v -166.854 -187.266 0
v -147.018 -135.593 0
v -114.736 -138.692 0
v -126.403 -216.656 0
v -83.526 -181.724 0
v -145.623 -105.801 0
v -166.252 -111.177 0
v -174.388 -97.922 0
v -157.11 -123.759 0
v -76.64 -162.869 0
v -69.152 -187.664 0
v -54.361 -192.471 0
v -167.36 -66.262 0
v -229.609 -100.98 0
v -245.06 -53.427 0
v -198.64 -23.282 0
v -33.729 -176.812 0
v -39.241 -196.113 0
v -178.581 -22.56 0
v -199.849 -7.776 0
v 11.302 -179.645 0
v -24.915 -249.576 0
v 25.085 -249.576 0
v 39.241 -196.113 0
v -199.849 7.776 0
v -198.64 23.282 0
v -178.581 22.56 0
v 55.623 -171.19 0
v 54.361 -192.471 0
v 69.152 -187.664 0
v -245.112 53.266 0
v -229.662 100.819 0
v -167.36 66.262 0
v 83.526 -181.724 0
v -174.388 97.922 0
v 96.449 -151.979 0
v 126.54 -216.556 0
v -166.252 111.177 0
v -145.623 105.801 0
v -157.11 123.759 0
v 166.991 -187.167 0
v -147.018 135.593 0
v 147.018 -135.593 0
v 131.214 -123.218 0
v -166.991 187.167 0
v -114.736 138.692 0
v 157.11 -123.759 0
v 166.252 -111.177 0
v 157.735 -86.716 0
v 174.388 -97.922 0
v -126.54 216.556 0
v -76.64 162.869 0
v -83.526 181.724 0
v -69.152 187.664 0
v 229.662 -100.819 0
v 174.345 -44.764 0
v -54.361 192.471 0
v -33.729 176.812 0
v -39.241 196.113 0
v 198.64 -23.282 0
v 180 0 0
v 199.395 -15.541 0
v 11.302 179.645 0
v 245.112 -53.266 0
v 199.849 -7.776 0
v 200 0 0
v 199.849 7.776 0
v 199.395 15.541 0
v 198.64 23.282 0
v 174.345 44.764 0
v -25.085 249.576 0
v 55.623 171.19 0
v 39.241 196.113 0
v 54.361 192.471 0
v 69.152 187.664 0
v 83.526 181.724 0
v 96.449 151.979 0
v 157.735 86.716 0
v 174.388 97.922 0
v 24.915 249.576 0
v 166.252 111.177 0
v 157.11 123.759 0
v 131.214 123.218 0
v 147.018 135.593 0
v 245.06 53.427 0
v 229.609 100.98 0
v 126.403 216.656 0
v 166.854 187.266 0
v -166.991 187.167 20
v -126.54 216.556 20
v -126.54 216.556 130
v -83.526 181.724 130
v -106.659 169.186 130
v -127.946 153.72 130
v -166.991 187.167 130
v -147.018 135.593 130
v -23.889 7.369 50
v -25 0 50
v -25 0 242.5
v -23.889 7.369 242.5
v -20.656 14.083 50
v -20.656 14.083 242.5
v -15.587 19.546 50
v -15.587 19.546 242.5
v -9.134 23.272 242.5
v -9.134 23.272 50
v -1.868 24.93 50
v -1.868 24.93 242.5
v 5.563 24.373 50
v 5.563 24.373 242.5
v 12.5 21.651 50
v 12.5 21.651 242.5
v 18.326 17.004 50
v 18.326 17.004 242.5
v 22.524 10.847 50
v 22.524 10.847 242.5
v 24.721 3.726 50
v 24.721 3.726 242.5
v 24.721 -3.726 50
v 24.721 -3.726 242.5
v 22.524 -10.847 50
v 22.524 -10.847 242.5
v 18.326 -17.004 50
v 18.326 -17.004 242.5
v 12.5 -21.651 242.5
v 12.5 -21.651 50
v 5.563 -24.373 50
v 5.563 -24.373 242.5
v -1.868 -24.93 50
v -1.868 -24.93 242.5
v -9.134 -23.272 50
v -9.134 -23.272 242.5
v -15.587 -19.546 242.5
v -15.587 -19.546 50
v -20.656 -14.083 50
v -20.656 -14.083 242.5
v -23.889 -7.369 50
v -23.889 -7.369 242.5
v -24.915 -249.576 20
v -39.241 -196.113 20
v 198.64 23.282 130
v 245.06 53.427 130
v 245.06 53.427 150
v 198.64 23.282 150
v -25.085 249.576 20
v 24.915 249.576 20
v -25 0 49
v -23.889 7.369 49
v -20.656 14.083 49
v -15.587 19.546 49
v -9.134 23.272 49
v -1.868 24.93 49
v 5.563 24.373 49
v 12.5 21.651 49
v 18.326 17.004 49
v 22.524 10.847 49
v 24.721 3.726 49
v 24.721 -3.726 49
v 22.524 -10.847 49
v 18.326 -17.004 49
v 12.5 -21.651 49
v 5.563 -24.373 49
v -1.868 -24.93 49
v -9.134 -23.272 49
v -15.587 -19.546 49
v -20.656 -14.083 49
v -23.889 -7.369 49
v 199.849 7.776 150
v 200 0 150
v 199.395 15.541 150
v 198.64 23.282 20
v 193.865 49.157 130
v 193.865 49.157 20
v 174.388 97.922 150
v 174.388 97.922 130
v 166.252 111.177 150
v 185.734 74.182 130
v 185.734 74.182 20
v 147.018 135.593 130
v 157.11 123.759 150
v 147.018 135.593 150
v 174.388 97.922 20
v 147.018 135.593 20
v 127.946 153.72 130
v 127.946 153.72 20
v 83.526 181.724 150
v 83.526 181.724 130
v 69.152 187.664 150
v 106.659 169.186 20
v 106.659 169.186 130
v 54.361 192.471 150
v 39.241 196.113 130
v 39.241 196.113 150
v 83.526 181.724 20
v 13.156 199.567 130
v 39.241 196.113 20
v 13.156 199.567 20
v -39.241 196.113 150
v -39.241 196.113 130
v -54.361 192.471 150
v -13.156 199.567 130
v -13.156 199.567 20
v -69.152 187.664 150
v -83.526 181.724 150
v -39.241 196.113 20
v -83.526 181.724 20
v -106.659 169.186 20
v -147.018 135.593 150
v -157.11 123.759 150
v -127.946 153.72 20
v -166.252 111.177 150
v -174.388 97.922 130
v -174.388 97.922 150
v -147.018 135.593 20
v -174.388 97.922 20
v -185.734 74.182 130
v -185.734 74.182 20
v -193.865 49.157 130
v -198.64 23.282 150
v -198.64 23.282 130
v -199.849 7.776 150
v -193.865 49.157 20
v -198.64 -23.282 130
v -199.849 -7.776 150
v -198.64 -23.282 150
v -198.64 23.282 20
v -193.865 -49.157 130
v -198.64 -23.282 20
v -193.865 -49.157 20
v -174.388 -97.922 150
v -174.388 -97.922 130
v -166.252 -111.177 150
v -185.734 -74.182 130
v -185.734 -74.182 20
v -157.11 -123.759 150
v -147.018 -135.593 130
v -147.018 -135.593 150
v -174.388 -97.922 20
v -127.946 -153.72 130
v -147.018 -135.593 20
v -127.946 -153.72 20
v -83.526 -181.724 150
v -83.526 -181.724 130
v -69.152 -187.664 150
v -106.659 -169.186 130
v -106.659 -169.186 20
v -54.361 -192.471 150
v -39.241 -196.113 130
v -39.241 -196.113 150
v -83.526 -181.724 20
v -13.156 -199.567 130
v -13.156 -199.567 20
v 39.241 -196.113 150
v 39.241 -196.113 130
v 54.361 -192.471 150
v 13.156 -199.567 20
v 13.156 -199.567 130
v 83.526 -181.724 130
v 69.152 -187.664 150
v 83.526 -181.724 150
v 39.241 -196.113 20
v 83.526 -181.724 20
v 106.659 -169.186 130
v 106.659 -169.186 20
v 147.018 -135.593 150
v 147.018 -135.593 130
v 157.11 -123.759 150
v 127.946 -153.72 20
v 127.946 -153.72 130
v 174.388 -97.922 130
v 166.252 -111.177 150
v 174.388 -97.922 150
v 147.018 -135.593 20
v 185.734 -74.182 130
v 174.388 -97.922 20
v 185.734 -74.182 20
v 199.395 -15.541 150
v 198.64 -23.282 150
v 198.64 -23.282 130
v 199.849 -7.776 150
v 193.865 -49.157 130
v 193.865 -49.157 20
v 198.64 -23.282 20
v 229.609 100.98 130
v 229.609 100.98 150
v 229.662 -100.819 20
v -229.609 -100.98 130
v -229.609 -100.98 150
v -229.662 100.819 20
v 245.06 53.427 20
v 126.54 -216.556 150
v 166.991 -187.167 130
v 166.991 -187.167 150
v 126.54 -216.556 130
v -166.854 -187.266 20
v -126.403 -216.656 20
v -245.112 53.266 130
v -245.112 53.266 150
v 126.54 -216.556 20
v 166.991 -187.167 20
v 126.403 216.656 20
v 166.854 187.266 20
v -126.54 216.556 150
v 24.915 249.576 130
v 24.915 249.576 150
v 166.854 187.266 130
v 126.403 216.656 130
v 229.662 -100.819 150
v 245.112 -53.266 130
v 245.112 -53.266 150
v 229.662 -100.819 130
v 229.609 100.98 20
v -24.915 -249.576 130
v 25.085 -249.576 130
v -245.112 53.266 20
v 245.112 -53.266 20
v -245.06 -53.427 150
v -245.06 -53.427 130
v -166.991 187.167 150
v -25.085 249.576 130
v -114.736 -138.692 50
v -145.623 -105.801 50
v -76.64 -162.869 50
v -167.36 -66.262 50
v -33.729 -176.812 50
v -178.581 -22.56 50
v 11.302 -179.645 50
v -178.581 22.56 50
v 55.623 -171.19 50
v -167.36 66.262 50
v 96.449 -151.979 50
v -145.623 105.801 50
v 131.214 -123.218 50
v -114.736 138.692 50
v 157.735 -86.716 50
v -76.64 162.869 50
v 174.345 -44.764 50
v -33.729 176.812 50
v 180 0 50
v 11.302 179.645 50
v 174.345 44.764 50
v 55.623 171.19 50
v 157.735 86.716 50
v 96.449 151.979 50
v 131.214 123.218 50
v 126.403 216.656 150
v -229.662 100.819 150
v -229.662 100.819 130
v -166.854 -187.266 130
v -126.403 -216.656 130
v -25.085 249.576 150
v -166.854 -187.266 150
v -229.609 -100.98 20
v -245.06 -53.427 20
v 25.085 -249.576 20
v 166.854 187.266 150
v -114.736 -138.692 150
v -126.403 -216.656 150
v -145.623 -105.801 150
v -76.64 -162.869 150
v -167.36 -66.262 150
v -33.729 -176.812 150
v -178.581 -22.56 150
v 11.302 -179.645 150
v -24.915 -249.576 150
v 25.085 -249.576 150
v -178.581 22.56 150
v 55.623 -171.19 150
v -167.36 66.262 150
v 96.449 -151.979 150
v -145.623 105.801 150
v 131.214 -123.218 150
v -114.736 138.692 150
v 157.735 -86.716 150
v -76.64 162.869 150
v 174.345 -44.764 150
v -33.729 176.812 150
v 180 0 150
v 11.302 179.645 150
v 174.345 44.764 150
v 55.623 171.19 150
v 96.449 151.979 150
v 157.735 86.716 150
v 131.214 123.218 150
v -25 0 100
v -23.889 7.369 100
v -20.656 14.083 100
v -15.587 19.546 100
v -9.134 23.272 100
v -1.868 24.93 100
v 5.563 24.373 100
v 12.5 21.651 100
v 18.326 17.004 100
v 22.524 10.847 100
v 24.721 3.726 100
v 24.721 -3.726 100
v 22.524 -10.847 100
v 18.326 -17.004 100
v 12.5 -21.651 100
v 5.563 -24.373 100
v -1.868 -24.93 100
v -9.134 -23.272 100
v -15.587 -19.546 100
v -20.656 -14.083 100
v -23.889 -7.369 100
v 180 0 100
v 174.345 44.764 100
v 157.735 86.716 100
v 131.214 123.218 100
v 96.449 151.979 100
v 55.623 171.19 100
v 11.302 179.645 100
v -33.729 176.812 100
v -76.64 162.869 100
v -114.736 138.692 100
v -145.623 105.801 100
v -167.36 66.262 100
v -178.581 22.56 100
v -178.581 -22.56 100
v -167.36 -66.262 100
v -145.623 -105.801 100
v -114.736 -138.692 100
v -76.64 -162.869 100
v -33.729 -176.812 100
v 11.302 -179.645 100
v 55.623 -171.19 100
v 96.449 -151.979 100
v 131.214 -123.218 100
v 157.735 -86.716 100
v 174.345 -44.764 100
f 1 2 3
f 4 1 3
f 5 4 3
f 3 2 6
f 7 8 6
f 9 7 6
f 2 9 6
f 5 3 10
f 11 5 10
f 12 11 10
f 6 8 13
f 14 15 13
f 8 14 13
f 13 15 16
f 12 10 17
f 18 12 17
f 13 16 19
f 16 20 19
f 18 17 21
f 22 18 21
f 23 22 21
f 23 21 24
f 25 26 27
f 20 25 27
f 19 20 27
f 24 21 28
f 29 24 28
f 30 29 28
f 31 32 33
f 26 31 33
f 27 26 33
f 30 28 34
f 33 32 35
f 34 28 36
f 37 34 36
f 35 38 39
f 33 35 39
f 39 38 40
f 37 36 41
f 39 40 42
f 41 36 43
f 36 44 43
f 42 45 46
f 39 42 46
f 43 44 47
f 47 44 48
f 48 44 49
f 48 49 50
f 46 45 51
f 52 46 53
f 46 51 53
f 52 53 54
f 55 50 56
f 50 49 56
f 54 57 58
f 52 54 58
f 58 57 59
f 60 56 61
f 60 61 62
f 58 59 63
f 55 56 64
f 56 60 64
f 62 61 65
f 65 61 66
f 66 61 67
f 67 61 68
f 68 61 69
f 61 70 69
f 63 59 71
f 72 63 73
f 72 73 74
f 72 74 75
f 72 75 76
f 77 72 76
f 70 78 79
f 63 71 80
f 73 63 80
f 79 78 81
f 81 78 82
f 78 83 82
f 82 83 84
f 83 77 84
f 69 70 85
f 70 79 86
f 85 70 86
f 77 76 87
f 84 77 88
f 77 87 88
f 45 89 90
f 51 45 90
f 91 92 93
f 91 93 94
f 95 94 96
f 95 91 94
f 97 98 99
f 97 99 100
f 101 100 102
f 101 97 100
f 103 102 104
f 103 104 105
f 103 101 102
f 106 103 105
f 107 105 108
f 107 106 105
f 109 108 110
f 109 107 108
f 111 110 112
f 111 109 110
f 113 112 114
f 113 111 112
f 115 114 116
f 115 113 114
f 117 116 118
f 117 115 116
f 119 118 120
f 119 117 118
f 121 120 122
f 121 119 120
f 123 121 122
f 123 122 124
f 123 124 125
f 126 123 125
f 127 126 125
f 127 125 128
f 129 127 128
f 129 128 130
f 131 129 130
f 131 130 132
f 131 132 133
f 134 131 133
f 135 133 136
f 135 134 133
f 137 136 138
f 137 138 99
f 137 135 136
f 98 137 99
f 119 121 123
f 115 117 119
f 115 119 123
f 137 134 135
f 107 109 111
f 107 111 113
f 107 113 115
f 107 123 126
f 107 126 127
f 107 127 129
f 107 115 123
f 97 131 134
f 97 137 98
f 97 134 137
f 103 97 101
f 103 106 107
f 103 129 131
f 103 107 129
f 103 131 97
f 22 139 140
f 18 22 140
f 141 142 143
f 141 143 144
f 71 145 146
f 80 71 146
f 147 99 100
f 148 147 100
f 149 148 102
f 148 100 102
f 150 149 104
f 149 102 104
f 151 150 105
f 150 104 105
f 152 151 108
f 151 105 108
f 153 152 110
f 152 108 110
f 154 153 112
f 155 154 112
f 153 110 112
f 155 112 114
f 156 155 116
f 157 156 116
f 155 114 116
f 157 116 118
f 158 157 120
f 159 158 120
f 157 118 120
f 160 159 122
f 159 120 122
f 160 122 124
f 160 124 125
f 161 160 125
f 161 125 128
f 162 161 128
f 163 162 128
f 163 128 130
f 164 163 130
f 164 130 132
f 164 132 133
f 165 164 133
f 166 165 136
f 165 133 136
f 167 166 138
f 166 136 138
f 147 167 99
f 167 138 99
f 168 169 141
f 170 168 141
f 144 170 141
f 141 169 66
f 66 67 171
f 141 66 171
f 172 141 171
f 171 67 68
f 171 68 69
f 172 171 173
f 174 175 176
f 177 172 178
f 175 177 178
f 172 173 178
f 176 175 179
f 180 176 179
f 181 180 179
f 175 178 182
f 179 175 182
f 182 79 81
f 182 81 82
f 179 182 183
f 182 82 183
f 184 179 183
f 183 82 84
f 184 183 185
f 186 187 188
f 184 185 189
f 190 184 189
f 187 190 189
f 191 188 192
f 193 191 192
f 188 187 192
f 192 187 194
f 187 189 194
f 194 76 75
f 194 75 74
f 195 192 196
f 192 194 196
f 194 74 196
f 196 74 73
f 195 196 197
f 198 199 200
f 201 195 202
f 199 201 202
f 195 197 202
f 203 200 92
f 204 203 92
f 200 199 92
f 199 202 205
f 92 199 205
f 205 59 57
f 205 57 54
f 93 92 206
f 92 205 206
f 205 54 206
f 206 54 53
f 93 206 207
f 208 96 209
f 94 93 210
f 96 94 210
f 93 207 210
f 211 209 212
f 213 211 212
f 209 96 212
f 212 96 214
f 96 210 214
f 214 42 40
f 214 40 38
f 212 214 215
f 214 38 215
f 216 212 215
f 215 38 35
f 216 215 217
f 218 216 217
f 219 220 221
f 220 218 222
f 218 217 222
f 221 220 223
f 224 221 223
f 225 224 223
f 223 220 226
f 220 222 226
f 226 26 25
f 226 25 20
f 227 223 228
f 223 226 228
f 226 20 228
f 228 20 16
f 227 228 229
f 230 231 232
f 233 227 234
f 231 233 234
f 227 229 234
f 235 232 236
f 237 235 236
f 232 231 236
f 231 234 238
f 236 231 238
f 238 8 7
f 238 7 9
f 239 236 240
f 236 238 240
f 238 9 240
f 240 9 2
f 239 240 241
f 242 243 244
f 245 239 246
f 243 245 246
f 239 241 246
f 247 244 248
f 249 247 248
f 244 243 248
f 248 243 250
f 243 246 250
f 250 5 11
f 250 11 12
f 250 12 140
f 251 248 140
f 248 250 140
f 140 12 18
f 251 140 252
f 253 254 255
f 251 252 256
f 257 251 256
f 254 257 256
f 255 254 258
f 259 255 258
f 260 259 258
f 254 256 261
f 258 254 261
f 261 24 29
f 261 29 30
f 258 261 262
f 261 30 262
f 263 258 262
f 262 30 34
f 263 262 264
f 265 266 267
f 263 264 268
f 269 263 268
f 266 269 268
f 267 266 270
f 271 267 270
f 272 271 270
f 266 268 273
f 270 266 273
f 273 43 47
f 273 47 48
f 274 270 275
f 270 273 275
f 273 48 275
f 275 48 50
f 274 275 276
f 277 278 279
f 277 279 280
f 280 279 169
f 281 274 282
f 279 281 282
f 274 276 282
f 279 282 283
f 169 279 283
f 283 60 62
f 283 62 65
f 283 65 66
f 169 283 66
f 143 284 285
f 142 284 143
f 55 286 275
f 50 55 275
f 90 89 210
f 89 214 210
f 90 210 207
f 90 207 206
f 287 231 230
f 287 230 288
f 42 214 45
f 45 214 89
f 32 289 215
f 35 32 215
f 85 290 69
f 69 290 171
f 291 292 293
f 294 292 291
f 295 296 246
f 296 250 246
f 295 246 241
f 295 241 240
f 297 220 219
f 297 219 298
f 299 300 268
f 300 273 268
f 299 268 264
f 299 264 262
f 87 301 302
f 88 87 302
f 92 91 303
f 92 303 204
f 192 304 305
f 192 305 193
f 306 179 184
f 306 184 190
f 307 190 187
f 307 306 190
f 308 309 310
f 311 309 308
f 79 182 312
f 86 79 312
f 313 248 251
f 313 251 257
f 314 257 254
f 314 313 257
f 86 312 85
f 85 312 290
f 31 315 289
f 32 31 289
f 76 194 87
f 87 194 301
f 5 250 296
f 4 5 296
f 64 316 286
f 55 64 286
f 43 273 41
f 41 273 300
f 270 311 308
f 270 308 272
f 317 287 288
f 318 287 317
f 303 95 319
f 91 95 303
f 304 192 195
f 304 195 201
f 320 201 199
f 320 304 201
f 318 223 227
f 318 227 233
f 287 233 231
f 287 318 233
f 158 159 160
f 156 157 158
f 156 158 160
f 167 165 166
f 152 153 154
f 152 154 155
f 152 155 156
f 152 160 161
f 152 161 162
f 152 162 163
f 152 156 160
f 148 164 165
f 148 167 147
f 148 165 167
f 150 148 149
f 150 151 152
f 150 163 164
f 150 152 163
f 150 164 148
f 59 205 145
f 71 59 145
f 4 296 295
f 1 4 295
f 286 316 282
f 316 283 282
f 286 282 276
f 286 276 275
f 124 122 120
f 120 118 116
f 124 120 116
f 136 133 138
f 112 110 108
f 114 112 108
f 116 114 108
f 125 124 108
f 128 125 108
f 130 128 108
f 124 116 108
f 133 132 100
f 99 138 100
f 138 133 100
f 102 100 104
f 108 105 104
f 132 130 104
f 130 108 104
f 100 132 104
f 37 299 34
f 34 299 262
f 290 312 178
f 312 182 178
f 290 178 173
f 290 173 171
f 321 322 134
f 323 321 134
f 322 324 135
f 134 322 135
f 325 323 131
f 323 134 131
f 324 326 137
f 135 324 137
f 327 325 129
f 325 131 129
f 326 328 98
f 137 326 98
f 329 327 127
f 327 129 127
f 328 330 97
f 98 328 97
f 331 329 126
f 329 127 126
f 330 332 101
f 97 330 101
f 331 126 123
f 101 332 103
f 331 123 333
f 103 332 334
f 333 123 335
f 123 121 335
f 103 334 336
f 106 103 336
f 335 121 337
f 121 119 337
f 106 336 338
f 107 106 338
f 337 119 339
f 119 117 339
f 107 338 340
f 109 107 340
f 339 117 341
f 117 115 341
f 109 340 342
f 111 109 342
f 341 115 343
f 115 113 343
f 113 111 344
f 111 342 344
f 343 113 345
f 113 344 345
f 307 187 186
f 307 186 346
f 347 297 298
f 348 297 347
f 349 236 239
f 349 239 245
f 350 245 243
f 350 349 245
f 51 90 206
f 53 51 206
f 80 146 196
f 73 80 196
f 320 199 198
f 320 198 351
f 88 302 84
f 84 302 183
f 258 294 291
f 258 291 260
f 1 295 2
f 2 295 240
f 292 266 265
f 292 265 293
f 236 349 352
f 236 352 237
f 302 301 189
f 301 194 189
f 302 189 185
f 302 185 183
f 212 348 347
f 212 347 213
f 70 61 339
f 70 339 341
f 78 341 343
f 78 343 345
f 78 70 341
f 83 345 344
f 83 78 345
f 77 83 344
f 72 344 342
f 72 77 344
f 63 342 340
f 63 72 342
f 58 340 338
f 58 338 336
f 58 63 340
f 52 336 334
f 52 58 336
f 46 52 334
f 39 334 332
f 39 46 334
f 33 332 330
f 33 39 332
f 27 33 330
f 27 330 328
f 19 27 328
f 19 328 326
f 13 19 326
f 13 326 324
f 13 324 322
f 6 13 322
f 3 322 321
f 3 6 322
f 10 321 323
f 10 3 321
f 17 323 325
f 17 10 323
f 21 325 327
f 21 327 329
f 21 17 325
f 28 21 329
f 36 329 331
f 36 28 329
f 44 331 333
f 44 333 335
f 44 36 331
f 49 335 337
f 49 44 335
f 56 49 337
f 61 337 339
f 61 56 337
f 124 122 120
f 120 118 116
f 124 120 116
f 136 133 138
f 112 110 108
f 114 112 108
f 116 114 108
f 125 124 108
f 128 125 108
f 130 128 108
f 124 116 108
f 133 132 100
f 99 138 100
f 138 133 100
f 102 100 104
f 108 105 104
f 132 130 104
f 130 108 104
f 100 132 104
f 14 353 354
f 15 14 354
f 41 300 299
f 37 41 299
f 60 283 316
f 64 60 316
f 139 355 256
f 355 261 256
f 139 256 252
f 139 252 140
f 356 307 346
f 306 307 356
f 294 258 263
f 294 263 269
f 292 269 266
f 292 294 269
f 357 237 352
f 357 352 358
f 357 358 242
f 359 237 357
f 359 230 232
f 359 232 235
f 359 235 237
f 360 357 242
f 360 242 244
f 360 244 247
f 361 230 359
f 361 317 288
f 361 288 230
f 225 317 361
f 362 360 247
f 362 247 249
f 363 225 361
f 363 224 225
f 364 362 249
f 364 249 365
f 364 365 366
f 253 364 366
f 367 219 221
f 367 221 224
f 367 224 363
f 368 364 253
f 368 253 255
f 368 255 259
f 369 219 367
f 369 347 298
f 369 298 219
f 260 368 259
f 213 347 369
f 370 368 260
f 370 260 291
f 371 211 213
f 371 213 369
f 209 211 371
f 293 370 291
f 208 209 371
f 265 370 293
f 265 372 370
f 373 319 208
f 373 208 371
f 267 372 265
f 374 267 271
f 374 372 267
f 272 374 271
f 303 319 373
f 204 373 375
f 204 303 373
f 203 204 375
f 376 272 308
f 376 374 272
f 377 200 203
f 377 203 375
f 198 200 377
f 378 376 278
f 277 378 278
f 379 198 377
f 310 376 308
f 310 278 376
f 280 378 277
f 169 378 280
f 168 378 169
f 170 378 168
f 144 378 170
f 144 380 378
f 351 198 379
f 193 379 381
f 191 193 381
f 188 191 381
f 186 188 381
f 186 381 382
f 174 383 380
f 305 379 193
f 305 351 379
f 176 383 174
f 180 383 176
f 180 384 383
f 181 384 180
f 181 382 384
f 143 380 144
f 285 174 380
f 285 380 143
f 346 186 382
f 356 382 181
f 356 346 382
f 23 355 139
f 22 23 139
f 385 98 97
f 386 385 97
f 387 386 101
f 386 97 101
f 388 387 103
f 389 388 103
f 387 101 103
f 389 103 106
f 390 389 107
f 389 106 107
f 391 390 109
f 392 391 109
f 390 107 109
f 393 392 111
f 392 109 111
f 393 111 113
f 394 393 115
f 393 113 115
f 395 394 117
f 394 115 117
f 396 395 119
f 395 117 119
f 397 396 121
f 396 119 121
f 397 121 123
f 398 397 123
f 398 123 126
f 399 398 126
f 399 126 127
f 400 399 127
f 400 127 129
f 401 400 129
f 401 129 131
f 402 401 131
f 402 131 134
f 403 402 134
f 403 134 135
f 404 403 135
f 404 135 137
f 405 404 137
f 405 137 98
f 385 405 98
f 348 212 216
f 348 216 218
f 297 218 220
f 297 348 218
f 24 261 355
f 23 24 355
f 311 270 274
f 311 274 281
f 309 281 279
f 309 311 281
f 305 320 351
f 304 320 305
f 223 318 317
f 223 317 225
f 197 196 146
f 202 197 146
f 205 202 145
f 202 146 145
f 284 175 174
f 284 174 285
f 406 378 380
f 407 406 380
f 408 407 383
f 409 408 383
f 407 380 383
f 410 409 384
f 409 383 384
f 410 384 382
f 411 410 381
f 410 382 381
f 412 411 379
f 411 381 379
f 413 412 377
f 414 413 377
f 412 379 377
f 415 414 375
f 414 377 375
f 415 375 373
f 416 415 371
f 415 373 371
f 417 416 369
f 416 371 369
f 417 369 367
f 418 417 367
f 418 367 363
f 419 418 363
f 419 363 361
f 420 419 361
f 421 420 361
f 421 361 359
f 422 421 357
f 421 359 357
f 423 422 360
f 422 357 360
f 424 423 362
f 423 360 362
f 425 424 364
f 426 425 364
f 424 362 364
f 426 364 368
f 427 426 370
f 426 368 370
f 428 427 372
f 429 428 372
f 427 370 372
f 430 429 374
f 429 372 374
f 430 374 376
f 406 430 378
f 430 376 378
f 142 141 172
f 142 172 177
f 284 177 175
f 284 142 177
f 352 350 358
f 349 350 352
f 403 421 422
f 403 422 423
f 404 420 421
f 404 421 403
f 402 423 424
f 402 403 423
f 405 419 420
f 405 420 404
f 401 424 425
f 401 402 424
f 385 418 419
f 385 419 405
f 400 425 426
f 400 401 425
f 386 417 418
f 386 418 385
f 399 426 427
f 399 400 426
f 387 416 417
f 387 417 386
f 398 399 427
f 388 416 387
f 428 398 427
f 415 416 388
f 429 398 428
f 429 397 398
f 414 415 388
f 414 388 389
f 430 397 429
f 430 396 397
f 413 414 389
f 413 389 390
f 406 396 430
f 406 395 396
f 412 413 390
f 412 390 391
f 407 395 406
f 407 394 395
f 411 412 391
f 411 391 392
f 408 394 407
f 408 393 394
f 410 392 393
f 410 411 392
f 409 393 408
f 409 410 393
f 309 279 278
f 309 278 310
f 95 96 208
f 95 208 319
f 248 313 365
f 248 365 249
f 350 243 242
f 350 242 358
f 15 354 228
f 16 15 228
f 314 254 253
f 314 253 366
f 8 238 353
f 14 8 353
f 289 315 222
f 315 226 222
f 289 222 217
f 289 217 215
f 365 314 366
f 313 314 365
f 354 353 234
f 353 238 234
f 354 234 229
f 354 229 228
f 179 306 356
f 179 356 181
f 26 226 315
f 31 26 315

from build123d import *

# Parameters (mm, degrees)
SKETCH2_R                = 200
BOSS_EXTRUDE1_DEPTH      = 150
BOSS_EXTRUDE2_START      = -20
BOSS_EXTRUDE2_DEPTH      = 20
CIRPATTERN1_COUNT        = 10
MIRROR1_START            = -20
MIRROR1_COPY_1_DEPTH     = 20
MIRROR1_COPY_2_DEPTH     = 20
MIRROR1_COPY_3_DEPTH     = 20
MIRROR1_COPY_4_DEPTH     = 20
MIRROR1_COPY_5_DEPTH     = 20
MIRROR1_COPY_6_DEPTH     = 20
MIRROR1_COPY_7_DEPTH     = 20
MIRROR1_COPY_8_DEPTH     = 20
MIRROR1_COPY_9_DEPTH     = 20
MIRROR1_COPY_10_DEPTH    = 20
SKETCH4_R                = 25
CUT_EXTRUDE1_DEPTH       = 381.615674099
SKETCH6_R                = 180
CUT_EXTRUDE2_DEPTH       = 50
BOSS_EXTRUDE4_DEPTH      = 1
BOSS_EXTRUDE4_DEPTH_BACK = 192.5
SKETCH7_2_R              = 25
SKETCH7_R                = 25
BOSS_EXTRUDE3_DEPTH      = 192.5


with BuildPart() as part:
    # Sketch2 → Boss-Extrude1 (new body)
    with BuildSketch(Plane.XY):
        Circle(SKETCH2_R)
    extrude(amount=BOSS_EXTRUDE1_DEPTH)

    # Sketch3 → Boss-Extrude2 (add)
    with BuildSketch(Plane.XY.offset(150).offset(BOSS_EXTRUDE2_START)):
        with BuildLine():
            Line((-25.084847023, 249.575960236), (24.915152977, 249.575960236))
            Line((24.915152977, 249.575960236), (39.240601235, 196.112659496))
            ThreePointArc((39.240601235, 196.112659496), (0, 200), (-39.240601235, 196.112659496))
            Line((-39.240601235, 196.112659496), (-25.084847023, 249.575960236))
        make_face()
    boss_extrude2 = extrude(amount=BOSS_EXTRUDE2_DEPTH)

    # CirPattern1: Boss-Extrude2 ×10 about axis
    cirpattern1_axis = Axis((0, 0, 150), (0, 0, 1))
    for i in range(1, CIRPATTERN1_COUNT):
        add(boss_extrude2.rotate(cirpattern1_axis, i * 360 / CIRPATTERN1_COUNT))

    # Mirror1 copy 1 sketch → Mirror1 copy 1 (add)
    with BuildSketch(Plane(origin=(0, 0, 0), x_dir=(0.8090169943749475, 0.5877852522924731, 0), z_dir=(0, 0, -1)).offset(MIRROR1_START)):
        with BuildLine():
            Line((-25.084847023, -249.575960236), (24.915152977, -249.575960236))
            Line((24.915152977, -249.575960236), (39.240601235, -196.112659496))
            ThreePointArc((39.240601235, -196.112659496), (0, -200), (-39.240601235, -196.112659496))
            Line((-39.240601235, -196.112659496), (-25.084847023, -249.575960236))
        make_face()
    extrude(amount=MIRROR1_COPY_1_DEPTH)

    # Mirror1 copy 2 sketch → Mirror1 copy 2 (add)
    with BuildSketch(Plane(origin=(0, 0, 0), x_dir=(0.30901699437494745, 0.9510565162951535, 0), z_dir=(0, 0, -1)).offset(MIRROR1_START)):
        with BuildLine():
            Line((-25.084847023, -249.575960236), (24.915152977, -249.575960236))
            Line((24.915152977, -249.575960236), (39.240601235, -196.112659496))
            ThreePointArc((39.240601235, -196.112659496), (0, -200), (-39.240601235, -196.112659496))
            Line((-39.240601235, -196.112659496), (-25.084847023, -249.575960236))
        make_face()
    extrude(amount=MIRROR1_COPY_2_DEPTH)

    # Mirror1 copy 3 sketch → Mirror1 copy 3 (add)
    with BuildSketch(Plane(origin=(0, 0, 0), x_dir=(-0.30901699437494734, 0.9510565162951536, 0), z_dir=(0, 0, -1)).offset(MIRROR1_START)):
        with BuildLine():
            Line((-25.084847023, -249.575960236), (24.915152977, -249.575960236))
            Line((24.915152977, -249.575960236), (39.240601235, -196.112659496))
            ThreePointArc((39.240601235, -196.112659496), (0, -200), (-39.240601235, -196.112659496))
            Line((-39.240601235, -196.112659496), (-25.084847023, -249.575960236))
        make_face()
    extrude(amount=MIRROR1_COPY_3_DEPTH)

    # Mirror1 copy 4 sketch → Mirror1 copy 4 (add)
    with BuildSketch(Plane(origin=(0, 0, 0), x_dir=(-0.8090169943749473, 0.5877852522924732, 0), z_dir=(0, 0, -1)).offset(MIRROR1_START)):
        with BuildLine():
            Line((-25.084847023, -249.575960236), (24.915152977, -249.575960236))
            Line((24.915152977, -249.575960236), (39.240601235, -196.112659496))
            ThreePointArc((39.240601235, -196.112659496), (0, -200), (-39.240601235, -196.112659496))
            Line((-39.240601235, -196.112659496), (-25.084847023, -249.575960236))
        make_face()
    extrude(amount=MIRROR1_COPY_4_DEPTH)

    # Mirror1 copy 5 sketch → Mirror1 copy 5 (add)
    with BuildSketch(Plane(origin=(0, 0, 0), x_dir=(-1, 0, 0), z_dir=(0, 0, -1)).offset(MIRROR1_START)):
        with BuildLine():
            Line((-25.084847023, -249.575960236), (24.915152977, -249.575960236))
            Line((24.915152977, -249.575960236), (39.240601235, -196.112659496))
            ThreePointArc((39.240601235, -196.112659496), (0, -200), (-39.240601235, -196.112659496))
            Line((-39.240601235, -196.112659496), (-25.084847023, -249.575960236))
        make_face()
    extrude(amount=MIRROR1_COPY_5_DEPTH)

    # Mirror1 copy 6 sketch → Mirror1 copy 6 (add)
    with BuildSketch(Plane(origin=(0, 0, 0), x_dir=(-0.8090169943749476, -0.587785252292473, 0), z_dir=(0, 0, -1)).offset(MIRROR1_START)):
        with BuildLine():
            Line((-25.084847023, -249.575960236), (24.915152977, -249.575960236))
            Line((24.915152977, -249.575960236), (39.240601235, -196.112659496))
            ThreePointArc((39.240601235, -196.112659496), (0, -200), (-39.240601235, -196.112659496))
            Line((-39.240601235, -196.112659496), (-25.084847023, -249.575960236))
        make_face()
    extrude(amount=MIRROR1_COPY_6_DEPTH)

    # Mirror1 copy 7 sketch → Mirror1 copy 7 (add)
    with BuildSketch(Plane(origin=(0, 0, 0), x_dir=(-0.30901699437494756, -0.9510565162951535, 0), z_dir=(0, 0, -1)).offset(MIRROR1_START)):
        with BuildLine():
            Line((-25.084847023, -249.575960236), (24.915152977, -249.575960236))
            Line((24.915152977, -249.575960236), (39.240601235, -196.112659496))
            ThreePointArc((39.240601235, -196.112659496), (0, -200), (-39.240601235, -196.112659496))
            Line((-39.240601235, -196.112659496), (-25.084847023, -249.575960236))
        make_face()
    extrude(amount=MIRROR1_COPY_7_DEPTH)

    # Mirror1 copy 8 sketch → Mirror1 copy 8 (add)
    with BuildSketch(Plane(origin=(0, 0, 0), x_dir=(0.30901699437494723, -0.9510565162951536, 0), z_dir=(0, 0, -1)).offset(MIRROR1_START)):
        with BuildLine():
            Line((-25.084847023, -249.575960236), (24.915152977, -249.575960236))
            Line((24.915152977, -249.575960236), (39.240601235, -196.112659496))
            ThreePointArc((39.240601235, -196.112659496), (0, -200), (-39.240601235, -196.112659496))
            Line((-39.240601235, -196.112659496), (-25.084847023, -249.575960236))
        make_face()
    extrude(amount=MIRROR1_COPY_8_DEPTH)

    # Mirror1 copy 9 sketch → Mirror1 copy 9 (add)
    with BuildSketch(Plane(origin=(0, 0, 0), x_dir=(0.8090169943749473, -0.5877852522924734, 0), z_dir=(0, 0, -1)).offset(MIRROR1_START)):
        with BuildLine():
            Line((-25.084847023, -249.575960236), (24.915152977, -249.575960236))
            Line((24.915152977, -249.575960236), (39.240601235, -196.112659496))
            ThreePointArc((39.240601235, -196.112659496), (0, -200), (-39.240601235, -196.112659496))
            Line((-39.240601235, -196.112659496), (-25.084847023, -249.575960236))
        make_face()
    extrude(amount=MIRROR1_COPY_9_DEPTH)

    # Mirror1 copy 10 sketch → Mirror1 copy 10 (add)
    with BuildSketch(Plane(origin=(0, 0, 0), x_dir=(1, 0, 0), z_dir=(0, 0, -1)).offset(MIRROR1_START)):
        with BuildLine():
            Line((-25.084847023, -249.575960236), (24.915152977, -249.575960236))
            Line((24.915152977, -249.575960236), (39.240601235, -196.112659496))
            ThreePointArc((39.240601235, -196.112659496), (0, -200), (-39.240601235, -196.112659496))
            Line((-39.240601235, -196.112659496), (-25.084847023, -249.575960236))
        make_face()
    extrude(amount=MIRROR1_COPY_10_DEPTH)

    # Sketch4 → Cut-Extrude1 (cut, through all)
    with BuildSketch(Plane(origin=(0, 0, 0), x_dir=(-1, 0, 0), z_dir=(0, 0, -1))):
        Circle(SKETCH4_R)
    extrude(amount=-CUT_EXTRUDE1_DEPTH, mode=Mode.SUBTRACT)

    # Sketch6 → Cut-Extrude2 (cut)
    with BuildSketch(Plane.XY.offset(150)):
        Circle(SKETCH6_R)
    cut_extrude2 = extrude(amount=-CUT_EXTRUDE2_DEPTH, mode=Mode.SUBTRACT)

    # Mirror2: Cut-Extrude2 across plane
    add(cut_extrude2.mirror(Plane.XY.offset(75)), mode=Mode.SUBTRACT)


with BuildPart() as body_2:
    # Sketch7<2> → Boss-Extrude4 (new, two sides: drawn at the far end of the back side and taken through both)
    with BuildSketch(Plane(origin=(0, 0, 50), x_dir=(-1, 0, 0), z_dir=(0, 0, -1)).offset(-BOSS_EXTRUDE4_DEPTH_BACK)):
        Circle(SKETCH7_2_R)
    extrude(amount=BOSS_EXTRUDE4_DEPTH + BOSS_EXTRUDE4_DEPTH_BACK)


with BuildPart() as body_3:
    # Sketch7 → Boss-Extrude3 (new body)
    with BuildSketch(Plane(origin=(0, 0, 50), x_dir=(-1, 0, 0), z_dir=(0, 0, -1))):
        Circle(SKETCH7_R)
    extrude(amount=-BOSS_EXTRUDE3_DEPTH)


solid = Compound([part.part, body_2.part, body_3.part])
